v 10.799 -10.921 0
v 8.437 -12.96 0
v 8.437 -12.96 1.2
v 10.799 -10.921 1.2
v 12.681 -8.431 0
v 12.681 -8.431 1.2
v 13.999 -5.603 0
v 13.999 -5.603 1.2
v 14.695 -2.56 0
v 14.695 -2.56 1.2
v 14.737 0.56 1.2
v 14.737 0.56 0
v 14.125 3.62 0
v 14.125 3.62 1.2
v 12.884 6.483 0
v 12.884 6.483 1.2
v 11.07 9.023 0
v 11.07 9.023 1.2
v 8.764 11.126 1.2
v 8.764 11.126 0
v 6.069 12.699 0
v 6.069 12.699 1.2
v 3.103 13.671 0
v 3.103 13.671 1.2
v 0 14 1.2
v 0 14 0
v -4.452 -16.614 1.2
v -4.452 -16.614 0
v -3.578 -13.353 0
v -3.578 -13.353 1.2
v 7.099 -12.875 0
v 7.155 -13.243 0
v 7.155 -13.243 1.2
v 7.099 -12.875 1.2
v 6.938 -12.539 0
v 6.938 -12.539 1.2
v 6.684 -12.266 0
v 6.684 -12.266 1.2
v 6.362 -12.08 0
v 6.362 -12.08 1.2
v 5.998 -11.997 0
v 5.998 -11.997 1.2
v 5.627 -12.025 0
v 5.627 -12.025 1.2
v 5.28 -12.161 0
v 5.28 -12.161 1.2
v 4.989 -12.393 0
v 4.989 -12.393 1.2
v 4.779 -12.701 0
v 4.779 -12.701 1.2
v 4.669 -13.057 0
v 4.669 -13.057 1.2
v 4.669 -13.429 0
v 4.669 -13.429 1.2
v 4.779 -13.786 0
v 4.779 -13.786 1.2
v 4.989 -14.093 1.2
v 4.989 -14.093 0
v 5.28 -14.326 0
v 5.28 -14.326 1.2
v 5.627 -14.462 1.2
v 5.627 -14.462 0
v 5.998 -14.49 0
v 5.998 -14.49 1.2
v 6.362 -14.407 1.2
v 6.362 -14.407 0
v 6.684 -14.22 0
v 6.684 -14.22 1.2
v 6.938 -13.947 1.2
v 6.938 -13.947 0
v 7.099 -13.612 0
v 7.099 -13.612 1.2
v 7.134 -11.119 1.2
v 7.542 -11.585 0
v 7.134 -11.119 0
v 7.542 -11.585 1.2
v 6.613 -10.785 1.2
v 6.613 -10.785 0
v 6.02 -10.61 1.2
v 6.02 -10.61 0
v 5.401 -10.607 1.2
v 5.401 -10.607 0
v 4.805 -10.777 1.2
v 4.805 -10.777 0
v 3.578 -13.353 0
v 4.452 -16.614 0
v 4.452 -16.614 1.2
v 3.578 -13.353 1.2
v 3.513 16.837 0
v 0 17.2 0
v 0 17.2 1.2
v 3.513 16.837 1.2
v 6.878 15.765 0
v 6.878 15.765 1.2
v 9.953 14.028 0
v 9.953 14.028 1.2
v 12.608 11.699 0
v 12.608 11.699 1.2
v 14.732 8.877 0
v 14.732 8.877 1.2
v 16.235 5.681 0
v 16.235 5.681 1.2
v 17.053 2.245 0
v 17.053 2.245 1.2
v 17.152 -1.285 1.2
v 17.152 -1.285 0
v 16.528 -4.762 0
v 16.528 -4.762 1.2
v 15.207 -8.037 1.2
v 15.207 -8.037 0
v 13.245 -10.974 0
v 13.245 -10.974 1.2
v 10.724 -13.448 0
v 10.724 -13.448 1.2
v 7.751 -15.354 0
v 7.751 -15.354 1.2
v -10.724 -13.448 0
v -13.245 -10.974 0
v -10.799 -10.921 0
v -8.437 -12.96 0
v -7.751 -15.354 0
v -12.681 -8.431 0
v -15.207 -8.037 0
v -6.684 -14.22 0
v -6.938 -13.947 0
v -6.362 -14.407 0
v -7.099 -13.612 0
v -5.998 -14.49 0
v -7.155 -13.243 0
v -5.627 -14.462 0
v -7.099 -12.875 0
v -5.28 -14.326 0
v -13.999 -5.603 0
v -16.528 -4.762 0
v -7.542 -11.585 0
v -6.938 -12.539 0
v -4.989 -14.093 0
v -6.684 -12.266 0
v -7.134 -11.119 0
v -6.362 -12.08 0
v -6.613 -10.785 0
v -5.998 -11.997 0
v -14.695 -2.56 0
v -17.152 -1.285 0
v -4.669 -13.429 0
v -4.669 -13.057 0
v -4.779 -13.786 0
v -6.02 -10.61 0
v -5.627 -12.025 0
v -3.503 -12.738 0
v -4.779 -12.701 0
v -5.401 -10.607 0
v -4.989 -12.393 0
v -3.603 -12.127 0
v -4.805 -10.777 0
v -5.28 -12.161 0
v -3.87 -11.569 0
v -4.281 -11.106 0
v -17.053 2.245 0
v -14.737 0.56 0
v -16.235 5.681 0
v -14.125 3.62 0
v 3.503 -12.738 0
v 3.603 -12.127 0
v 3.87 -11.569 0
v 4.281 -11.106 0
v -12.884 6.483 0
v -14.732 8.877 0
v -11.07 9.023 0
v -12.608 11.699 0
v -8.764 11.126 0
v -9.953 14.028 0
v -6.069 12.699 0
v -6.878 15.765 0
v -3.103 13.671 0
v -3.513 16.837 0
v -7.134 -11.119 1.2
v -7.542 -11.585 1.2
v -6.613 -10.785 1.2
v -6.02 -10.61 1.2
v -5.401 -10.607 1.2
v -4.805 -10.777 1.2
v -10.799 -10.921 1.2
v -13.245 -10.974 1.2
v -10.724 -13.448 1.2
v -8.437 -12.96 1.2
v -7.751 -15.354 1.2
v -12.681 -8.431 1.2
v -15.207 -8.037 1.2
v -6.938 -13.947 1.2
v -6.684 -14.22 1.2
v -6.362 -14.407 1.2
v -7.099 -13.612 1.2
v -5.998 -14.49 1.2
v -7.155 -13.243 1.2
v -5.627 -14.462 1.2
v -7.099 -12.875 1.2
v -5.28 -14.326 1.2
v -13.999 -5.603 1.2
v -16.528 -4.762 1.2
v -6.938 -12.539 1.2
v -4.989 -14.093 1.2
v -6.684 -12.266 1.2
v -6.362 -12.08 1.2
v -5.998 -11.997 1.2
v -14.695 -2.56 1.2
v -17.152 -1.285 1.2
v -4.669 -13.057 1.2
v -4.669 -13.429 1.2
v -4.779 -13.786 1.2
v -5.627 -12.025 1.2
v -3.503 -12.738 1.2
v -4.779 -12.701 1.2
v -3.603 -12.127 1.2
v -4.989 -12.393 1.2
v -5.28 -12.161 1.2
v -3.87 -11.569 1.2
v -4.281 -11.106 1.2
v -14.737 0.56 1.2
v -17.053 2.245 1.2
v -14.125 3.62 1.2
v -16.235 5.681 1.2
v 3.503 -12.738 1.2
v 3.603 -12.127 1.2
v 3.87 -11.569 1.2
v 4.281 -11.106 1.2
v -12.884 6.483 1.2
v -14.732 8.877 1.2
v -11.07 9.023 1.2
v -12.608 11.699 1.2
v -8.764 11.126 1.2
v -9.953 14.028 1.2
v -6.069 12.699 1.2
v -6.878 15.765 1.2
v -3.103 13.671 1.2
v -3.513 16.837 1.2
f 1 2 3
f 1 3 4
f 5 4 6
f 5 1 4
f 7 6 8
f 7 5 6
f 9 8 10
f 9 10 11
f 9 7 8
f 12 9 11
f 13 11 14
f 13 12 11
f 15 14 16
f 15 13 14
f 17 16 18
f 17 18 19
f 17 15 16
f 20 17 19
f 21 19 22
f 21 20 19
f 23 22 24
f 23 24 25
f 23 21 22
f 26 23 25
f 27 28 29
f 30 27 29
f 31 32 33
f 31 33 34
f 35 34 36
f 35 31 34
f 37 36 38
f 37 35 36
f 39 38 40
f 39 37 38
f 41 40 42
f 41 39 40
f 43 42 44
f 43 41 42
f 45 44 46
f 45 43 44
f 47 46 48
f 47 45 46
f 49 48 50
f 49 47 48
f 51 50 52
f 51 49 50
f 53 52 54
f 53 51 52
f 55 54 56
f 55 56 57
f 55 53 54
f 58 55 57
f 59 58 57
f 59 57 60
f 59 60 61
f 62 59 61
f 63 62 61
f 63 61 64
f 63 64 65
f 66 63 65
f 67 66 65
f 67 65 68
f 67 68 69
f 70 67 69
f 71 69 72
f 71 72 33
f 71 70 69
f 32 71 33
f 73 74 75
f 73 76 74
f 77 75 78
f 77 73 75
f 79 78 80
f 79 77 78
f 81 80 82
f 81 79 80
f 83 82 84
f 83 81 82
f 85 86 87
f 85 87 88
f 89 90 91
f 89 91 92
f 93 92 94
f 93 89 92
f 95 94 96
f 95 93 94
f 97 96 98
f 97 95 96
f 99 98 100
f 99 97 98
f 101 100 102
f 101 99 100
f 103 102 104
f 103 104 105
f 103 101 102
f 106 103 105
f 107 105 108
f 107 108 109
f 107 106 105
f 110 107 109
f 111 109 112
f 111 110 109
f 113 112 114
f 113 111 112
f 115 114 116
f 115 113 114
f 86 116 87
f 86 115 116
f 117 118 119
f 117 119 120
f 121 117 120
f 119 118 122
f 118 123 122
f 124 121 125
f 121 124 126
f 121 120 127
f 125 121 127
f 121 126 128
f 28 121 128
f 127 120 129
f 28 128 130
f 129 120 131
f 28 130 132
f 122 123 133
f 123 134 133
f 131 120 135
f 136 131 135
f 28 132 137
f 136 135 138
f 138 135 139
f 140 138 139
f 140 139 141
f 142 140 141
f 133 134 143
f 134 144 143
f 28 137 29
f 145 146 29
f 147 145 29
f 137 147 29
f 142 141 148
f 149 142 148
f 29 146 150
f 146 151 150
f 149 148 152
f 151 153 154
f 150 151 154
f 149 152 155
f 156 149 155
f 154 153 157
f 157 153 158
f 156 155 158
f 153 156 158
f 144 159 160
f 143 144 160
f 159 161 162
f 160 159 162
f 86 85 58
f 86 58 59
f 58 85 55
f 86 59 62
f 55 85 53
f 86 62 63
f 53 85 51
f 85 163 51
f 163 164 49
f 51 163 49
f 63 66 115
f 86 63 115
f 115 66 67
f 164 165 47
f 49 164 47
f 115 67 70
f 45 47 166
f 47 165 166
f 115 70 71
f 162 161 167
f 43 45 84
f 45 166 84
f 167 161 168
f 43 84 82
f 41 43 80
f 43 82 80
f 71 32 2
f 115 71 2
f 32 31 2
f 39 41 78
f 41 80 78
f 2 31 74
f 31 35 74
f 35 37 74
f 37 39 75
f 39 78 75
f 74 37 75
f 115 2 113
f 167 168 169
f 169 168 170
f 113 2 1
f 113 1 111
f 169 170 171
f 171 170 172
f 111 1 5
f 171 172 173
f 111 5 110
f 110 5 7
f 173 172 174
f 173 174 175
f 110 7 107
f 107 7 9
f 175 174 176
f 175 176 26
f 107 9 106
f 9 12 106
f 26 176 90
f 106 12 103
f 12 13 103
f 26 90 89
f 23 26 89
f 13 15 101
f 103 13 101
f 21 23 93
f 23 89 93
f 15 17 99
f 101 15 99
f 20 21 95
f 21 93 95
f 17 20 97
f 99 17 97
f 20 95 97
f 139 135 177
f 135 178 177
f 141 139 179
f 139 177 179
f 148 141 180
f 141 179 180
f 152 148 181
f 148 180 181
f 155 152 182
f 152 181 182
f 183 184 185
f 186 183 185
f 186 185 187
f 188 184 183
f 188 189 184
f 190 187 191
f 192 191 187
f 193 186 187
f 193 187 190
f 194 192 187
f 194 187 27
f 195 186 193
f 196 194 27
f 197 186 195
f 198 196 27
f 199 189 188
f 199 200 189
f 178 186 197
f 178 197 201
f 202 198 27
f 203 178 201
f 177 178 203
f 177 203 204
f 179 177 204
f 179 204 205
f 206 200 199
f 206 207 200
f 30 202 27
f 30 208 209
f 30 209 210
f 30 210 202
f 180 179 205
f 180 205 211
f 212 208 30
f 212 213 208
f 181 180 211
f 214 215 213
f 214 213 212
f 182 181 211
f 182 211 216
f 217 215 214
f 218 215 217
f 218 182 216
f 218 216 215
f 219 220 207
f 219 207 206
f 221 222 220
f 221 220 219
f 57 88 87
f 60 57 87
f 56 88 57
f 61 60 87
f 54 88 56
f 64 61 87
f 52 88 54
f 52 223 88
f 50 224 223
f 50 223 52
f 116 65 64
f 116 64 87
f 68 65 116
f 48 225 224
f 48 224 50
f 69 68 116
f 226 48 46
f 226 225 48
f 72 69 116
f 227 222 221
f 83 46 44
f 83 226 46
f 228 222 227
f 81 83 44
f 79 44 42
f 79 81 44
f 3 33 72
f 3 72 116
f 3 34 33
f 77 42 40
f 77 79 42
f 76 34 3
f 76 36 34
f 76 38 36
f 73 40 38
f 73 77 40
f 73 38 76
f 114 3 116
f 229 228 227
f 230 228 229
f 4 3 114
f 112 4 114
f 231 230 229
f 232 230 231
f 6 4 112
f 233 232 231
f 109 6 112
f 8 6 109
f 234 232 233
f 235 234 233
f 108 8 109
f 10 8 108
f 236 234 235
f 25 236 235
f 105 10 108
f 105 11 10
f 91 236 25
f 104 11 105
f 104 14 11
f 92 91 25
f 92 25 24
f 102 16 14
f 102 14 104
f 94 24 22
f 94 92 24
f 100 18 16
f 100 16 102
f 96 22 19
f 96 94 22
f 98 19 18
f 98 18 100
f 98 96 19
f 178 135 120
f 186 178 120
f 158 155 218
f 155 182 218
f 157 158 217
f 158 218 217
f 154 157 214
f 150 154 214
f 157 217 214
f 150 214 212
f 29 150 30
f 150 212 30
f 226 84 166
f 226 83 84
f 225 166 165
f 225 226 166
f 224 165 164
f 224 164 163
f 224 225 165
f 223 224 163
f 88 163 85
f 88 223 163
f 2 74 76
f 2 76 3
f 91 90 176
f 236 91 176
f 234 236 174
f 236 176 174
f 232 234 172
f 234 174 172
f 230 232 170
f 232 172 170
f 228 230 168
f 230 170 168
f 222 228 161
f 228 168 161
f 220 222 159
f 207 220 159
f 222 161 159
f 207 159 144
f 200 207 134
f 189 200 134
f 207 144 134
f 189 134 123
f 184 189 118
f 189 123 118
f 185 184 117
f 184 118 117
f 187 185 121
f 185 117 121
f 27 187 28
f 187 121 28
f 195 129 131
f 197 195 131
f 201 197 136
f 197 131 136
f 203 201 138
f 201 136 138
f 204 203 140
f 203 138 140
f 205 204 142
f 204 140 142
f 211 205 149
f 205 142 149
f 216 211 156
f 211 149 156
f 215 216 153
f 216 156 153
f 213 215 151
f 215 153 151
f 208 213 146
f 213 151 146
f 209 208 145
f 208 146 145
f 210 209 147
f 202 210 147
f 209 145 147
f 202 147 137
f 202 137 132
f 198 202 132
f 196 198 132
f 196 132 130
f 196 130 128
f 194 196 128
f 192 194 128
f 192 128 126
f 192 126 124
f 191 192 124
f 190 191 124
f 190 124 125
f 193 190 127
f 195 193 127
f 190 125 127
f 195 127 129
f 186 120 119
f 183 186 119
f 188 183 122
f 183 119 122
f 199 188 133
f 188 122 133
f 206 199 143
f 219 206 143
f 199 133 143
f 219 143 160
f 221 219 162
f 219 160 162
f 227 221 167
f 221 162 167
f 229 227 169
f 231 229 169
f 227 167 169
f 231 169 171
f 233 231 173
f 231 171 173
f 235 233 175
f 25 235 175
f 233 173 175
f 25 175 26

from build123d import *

# Parameters (mm, degrees)
SKETCH2_R           = 1.25
BOSS_EXTRUDE1_DEPTH = 1.2
FILLET1_R           = 2.197241


with BuildPart() as part:
    # Sketch2 → Boss-Extrude1 (new body)
    with BuildSketch(Plane.XY):
        with BuildLine():
            Line((6.518417516, -10.013392411), (8.436546126, -12.95996256))
            ThreePointArc((8.436546126, -12.95996256), (14.124578682, 3.619986092), (0, 14))
            Line((0, 14), (0, 17.2))
            ThreePointArc((0, 17.2), (17.052851616, 2.245050506), (4.451687576, -16.613924212))
            Line((4.451687576, -16.613924212), (3.092403424, -11.541006696))
            Line((3.092403424, -11.541006696), (6.518417516, -10.013392411))
        make_face()
        with Locations((5.904953543, -13.243168943)):
            Circle(SKETCH2_R, mode=Mode.SUBTRACT)
    extrude(amount=BOSS_EXTRUDE1_DEPTH)

    # Fillet1
    fillet1_edges = [part.edges().sort_by_distance(p)[0] for p in [
        (6.518417516, -10.013392411, 0.6),
        (3.092403424, -11.541006696, 0.6),
    ]]
    fillet(fillet1_edges, radius=FILLET1_R)

    # Mirror1: part across plane


with BuildPart() as part_1:
    add(part.part)
    add(part.part.mirror(Plane(origin=(0, 17.2, 1.2), x_dir=(0, 0, 1), z_dir=(1, 0, 0))))


solid = part_1.part
